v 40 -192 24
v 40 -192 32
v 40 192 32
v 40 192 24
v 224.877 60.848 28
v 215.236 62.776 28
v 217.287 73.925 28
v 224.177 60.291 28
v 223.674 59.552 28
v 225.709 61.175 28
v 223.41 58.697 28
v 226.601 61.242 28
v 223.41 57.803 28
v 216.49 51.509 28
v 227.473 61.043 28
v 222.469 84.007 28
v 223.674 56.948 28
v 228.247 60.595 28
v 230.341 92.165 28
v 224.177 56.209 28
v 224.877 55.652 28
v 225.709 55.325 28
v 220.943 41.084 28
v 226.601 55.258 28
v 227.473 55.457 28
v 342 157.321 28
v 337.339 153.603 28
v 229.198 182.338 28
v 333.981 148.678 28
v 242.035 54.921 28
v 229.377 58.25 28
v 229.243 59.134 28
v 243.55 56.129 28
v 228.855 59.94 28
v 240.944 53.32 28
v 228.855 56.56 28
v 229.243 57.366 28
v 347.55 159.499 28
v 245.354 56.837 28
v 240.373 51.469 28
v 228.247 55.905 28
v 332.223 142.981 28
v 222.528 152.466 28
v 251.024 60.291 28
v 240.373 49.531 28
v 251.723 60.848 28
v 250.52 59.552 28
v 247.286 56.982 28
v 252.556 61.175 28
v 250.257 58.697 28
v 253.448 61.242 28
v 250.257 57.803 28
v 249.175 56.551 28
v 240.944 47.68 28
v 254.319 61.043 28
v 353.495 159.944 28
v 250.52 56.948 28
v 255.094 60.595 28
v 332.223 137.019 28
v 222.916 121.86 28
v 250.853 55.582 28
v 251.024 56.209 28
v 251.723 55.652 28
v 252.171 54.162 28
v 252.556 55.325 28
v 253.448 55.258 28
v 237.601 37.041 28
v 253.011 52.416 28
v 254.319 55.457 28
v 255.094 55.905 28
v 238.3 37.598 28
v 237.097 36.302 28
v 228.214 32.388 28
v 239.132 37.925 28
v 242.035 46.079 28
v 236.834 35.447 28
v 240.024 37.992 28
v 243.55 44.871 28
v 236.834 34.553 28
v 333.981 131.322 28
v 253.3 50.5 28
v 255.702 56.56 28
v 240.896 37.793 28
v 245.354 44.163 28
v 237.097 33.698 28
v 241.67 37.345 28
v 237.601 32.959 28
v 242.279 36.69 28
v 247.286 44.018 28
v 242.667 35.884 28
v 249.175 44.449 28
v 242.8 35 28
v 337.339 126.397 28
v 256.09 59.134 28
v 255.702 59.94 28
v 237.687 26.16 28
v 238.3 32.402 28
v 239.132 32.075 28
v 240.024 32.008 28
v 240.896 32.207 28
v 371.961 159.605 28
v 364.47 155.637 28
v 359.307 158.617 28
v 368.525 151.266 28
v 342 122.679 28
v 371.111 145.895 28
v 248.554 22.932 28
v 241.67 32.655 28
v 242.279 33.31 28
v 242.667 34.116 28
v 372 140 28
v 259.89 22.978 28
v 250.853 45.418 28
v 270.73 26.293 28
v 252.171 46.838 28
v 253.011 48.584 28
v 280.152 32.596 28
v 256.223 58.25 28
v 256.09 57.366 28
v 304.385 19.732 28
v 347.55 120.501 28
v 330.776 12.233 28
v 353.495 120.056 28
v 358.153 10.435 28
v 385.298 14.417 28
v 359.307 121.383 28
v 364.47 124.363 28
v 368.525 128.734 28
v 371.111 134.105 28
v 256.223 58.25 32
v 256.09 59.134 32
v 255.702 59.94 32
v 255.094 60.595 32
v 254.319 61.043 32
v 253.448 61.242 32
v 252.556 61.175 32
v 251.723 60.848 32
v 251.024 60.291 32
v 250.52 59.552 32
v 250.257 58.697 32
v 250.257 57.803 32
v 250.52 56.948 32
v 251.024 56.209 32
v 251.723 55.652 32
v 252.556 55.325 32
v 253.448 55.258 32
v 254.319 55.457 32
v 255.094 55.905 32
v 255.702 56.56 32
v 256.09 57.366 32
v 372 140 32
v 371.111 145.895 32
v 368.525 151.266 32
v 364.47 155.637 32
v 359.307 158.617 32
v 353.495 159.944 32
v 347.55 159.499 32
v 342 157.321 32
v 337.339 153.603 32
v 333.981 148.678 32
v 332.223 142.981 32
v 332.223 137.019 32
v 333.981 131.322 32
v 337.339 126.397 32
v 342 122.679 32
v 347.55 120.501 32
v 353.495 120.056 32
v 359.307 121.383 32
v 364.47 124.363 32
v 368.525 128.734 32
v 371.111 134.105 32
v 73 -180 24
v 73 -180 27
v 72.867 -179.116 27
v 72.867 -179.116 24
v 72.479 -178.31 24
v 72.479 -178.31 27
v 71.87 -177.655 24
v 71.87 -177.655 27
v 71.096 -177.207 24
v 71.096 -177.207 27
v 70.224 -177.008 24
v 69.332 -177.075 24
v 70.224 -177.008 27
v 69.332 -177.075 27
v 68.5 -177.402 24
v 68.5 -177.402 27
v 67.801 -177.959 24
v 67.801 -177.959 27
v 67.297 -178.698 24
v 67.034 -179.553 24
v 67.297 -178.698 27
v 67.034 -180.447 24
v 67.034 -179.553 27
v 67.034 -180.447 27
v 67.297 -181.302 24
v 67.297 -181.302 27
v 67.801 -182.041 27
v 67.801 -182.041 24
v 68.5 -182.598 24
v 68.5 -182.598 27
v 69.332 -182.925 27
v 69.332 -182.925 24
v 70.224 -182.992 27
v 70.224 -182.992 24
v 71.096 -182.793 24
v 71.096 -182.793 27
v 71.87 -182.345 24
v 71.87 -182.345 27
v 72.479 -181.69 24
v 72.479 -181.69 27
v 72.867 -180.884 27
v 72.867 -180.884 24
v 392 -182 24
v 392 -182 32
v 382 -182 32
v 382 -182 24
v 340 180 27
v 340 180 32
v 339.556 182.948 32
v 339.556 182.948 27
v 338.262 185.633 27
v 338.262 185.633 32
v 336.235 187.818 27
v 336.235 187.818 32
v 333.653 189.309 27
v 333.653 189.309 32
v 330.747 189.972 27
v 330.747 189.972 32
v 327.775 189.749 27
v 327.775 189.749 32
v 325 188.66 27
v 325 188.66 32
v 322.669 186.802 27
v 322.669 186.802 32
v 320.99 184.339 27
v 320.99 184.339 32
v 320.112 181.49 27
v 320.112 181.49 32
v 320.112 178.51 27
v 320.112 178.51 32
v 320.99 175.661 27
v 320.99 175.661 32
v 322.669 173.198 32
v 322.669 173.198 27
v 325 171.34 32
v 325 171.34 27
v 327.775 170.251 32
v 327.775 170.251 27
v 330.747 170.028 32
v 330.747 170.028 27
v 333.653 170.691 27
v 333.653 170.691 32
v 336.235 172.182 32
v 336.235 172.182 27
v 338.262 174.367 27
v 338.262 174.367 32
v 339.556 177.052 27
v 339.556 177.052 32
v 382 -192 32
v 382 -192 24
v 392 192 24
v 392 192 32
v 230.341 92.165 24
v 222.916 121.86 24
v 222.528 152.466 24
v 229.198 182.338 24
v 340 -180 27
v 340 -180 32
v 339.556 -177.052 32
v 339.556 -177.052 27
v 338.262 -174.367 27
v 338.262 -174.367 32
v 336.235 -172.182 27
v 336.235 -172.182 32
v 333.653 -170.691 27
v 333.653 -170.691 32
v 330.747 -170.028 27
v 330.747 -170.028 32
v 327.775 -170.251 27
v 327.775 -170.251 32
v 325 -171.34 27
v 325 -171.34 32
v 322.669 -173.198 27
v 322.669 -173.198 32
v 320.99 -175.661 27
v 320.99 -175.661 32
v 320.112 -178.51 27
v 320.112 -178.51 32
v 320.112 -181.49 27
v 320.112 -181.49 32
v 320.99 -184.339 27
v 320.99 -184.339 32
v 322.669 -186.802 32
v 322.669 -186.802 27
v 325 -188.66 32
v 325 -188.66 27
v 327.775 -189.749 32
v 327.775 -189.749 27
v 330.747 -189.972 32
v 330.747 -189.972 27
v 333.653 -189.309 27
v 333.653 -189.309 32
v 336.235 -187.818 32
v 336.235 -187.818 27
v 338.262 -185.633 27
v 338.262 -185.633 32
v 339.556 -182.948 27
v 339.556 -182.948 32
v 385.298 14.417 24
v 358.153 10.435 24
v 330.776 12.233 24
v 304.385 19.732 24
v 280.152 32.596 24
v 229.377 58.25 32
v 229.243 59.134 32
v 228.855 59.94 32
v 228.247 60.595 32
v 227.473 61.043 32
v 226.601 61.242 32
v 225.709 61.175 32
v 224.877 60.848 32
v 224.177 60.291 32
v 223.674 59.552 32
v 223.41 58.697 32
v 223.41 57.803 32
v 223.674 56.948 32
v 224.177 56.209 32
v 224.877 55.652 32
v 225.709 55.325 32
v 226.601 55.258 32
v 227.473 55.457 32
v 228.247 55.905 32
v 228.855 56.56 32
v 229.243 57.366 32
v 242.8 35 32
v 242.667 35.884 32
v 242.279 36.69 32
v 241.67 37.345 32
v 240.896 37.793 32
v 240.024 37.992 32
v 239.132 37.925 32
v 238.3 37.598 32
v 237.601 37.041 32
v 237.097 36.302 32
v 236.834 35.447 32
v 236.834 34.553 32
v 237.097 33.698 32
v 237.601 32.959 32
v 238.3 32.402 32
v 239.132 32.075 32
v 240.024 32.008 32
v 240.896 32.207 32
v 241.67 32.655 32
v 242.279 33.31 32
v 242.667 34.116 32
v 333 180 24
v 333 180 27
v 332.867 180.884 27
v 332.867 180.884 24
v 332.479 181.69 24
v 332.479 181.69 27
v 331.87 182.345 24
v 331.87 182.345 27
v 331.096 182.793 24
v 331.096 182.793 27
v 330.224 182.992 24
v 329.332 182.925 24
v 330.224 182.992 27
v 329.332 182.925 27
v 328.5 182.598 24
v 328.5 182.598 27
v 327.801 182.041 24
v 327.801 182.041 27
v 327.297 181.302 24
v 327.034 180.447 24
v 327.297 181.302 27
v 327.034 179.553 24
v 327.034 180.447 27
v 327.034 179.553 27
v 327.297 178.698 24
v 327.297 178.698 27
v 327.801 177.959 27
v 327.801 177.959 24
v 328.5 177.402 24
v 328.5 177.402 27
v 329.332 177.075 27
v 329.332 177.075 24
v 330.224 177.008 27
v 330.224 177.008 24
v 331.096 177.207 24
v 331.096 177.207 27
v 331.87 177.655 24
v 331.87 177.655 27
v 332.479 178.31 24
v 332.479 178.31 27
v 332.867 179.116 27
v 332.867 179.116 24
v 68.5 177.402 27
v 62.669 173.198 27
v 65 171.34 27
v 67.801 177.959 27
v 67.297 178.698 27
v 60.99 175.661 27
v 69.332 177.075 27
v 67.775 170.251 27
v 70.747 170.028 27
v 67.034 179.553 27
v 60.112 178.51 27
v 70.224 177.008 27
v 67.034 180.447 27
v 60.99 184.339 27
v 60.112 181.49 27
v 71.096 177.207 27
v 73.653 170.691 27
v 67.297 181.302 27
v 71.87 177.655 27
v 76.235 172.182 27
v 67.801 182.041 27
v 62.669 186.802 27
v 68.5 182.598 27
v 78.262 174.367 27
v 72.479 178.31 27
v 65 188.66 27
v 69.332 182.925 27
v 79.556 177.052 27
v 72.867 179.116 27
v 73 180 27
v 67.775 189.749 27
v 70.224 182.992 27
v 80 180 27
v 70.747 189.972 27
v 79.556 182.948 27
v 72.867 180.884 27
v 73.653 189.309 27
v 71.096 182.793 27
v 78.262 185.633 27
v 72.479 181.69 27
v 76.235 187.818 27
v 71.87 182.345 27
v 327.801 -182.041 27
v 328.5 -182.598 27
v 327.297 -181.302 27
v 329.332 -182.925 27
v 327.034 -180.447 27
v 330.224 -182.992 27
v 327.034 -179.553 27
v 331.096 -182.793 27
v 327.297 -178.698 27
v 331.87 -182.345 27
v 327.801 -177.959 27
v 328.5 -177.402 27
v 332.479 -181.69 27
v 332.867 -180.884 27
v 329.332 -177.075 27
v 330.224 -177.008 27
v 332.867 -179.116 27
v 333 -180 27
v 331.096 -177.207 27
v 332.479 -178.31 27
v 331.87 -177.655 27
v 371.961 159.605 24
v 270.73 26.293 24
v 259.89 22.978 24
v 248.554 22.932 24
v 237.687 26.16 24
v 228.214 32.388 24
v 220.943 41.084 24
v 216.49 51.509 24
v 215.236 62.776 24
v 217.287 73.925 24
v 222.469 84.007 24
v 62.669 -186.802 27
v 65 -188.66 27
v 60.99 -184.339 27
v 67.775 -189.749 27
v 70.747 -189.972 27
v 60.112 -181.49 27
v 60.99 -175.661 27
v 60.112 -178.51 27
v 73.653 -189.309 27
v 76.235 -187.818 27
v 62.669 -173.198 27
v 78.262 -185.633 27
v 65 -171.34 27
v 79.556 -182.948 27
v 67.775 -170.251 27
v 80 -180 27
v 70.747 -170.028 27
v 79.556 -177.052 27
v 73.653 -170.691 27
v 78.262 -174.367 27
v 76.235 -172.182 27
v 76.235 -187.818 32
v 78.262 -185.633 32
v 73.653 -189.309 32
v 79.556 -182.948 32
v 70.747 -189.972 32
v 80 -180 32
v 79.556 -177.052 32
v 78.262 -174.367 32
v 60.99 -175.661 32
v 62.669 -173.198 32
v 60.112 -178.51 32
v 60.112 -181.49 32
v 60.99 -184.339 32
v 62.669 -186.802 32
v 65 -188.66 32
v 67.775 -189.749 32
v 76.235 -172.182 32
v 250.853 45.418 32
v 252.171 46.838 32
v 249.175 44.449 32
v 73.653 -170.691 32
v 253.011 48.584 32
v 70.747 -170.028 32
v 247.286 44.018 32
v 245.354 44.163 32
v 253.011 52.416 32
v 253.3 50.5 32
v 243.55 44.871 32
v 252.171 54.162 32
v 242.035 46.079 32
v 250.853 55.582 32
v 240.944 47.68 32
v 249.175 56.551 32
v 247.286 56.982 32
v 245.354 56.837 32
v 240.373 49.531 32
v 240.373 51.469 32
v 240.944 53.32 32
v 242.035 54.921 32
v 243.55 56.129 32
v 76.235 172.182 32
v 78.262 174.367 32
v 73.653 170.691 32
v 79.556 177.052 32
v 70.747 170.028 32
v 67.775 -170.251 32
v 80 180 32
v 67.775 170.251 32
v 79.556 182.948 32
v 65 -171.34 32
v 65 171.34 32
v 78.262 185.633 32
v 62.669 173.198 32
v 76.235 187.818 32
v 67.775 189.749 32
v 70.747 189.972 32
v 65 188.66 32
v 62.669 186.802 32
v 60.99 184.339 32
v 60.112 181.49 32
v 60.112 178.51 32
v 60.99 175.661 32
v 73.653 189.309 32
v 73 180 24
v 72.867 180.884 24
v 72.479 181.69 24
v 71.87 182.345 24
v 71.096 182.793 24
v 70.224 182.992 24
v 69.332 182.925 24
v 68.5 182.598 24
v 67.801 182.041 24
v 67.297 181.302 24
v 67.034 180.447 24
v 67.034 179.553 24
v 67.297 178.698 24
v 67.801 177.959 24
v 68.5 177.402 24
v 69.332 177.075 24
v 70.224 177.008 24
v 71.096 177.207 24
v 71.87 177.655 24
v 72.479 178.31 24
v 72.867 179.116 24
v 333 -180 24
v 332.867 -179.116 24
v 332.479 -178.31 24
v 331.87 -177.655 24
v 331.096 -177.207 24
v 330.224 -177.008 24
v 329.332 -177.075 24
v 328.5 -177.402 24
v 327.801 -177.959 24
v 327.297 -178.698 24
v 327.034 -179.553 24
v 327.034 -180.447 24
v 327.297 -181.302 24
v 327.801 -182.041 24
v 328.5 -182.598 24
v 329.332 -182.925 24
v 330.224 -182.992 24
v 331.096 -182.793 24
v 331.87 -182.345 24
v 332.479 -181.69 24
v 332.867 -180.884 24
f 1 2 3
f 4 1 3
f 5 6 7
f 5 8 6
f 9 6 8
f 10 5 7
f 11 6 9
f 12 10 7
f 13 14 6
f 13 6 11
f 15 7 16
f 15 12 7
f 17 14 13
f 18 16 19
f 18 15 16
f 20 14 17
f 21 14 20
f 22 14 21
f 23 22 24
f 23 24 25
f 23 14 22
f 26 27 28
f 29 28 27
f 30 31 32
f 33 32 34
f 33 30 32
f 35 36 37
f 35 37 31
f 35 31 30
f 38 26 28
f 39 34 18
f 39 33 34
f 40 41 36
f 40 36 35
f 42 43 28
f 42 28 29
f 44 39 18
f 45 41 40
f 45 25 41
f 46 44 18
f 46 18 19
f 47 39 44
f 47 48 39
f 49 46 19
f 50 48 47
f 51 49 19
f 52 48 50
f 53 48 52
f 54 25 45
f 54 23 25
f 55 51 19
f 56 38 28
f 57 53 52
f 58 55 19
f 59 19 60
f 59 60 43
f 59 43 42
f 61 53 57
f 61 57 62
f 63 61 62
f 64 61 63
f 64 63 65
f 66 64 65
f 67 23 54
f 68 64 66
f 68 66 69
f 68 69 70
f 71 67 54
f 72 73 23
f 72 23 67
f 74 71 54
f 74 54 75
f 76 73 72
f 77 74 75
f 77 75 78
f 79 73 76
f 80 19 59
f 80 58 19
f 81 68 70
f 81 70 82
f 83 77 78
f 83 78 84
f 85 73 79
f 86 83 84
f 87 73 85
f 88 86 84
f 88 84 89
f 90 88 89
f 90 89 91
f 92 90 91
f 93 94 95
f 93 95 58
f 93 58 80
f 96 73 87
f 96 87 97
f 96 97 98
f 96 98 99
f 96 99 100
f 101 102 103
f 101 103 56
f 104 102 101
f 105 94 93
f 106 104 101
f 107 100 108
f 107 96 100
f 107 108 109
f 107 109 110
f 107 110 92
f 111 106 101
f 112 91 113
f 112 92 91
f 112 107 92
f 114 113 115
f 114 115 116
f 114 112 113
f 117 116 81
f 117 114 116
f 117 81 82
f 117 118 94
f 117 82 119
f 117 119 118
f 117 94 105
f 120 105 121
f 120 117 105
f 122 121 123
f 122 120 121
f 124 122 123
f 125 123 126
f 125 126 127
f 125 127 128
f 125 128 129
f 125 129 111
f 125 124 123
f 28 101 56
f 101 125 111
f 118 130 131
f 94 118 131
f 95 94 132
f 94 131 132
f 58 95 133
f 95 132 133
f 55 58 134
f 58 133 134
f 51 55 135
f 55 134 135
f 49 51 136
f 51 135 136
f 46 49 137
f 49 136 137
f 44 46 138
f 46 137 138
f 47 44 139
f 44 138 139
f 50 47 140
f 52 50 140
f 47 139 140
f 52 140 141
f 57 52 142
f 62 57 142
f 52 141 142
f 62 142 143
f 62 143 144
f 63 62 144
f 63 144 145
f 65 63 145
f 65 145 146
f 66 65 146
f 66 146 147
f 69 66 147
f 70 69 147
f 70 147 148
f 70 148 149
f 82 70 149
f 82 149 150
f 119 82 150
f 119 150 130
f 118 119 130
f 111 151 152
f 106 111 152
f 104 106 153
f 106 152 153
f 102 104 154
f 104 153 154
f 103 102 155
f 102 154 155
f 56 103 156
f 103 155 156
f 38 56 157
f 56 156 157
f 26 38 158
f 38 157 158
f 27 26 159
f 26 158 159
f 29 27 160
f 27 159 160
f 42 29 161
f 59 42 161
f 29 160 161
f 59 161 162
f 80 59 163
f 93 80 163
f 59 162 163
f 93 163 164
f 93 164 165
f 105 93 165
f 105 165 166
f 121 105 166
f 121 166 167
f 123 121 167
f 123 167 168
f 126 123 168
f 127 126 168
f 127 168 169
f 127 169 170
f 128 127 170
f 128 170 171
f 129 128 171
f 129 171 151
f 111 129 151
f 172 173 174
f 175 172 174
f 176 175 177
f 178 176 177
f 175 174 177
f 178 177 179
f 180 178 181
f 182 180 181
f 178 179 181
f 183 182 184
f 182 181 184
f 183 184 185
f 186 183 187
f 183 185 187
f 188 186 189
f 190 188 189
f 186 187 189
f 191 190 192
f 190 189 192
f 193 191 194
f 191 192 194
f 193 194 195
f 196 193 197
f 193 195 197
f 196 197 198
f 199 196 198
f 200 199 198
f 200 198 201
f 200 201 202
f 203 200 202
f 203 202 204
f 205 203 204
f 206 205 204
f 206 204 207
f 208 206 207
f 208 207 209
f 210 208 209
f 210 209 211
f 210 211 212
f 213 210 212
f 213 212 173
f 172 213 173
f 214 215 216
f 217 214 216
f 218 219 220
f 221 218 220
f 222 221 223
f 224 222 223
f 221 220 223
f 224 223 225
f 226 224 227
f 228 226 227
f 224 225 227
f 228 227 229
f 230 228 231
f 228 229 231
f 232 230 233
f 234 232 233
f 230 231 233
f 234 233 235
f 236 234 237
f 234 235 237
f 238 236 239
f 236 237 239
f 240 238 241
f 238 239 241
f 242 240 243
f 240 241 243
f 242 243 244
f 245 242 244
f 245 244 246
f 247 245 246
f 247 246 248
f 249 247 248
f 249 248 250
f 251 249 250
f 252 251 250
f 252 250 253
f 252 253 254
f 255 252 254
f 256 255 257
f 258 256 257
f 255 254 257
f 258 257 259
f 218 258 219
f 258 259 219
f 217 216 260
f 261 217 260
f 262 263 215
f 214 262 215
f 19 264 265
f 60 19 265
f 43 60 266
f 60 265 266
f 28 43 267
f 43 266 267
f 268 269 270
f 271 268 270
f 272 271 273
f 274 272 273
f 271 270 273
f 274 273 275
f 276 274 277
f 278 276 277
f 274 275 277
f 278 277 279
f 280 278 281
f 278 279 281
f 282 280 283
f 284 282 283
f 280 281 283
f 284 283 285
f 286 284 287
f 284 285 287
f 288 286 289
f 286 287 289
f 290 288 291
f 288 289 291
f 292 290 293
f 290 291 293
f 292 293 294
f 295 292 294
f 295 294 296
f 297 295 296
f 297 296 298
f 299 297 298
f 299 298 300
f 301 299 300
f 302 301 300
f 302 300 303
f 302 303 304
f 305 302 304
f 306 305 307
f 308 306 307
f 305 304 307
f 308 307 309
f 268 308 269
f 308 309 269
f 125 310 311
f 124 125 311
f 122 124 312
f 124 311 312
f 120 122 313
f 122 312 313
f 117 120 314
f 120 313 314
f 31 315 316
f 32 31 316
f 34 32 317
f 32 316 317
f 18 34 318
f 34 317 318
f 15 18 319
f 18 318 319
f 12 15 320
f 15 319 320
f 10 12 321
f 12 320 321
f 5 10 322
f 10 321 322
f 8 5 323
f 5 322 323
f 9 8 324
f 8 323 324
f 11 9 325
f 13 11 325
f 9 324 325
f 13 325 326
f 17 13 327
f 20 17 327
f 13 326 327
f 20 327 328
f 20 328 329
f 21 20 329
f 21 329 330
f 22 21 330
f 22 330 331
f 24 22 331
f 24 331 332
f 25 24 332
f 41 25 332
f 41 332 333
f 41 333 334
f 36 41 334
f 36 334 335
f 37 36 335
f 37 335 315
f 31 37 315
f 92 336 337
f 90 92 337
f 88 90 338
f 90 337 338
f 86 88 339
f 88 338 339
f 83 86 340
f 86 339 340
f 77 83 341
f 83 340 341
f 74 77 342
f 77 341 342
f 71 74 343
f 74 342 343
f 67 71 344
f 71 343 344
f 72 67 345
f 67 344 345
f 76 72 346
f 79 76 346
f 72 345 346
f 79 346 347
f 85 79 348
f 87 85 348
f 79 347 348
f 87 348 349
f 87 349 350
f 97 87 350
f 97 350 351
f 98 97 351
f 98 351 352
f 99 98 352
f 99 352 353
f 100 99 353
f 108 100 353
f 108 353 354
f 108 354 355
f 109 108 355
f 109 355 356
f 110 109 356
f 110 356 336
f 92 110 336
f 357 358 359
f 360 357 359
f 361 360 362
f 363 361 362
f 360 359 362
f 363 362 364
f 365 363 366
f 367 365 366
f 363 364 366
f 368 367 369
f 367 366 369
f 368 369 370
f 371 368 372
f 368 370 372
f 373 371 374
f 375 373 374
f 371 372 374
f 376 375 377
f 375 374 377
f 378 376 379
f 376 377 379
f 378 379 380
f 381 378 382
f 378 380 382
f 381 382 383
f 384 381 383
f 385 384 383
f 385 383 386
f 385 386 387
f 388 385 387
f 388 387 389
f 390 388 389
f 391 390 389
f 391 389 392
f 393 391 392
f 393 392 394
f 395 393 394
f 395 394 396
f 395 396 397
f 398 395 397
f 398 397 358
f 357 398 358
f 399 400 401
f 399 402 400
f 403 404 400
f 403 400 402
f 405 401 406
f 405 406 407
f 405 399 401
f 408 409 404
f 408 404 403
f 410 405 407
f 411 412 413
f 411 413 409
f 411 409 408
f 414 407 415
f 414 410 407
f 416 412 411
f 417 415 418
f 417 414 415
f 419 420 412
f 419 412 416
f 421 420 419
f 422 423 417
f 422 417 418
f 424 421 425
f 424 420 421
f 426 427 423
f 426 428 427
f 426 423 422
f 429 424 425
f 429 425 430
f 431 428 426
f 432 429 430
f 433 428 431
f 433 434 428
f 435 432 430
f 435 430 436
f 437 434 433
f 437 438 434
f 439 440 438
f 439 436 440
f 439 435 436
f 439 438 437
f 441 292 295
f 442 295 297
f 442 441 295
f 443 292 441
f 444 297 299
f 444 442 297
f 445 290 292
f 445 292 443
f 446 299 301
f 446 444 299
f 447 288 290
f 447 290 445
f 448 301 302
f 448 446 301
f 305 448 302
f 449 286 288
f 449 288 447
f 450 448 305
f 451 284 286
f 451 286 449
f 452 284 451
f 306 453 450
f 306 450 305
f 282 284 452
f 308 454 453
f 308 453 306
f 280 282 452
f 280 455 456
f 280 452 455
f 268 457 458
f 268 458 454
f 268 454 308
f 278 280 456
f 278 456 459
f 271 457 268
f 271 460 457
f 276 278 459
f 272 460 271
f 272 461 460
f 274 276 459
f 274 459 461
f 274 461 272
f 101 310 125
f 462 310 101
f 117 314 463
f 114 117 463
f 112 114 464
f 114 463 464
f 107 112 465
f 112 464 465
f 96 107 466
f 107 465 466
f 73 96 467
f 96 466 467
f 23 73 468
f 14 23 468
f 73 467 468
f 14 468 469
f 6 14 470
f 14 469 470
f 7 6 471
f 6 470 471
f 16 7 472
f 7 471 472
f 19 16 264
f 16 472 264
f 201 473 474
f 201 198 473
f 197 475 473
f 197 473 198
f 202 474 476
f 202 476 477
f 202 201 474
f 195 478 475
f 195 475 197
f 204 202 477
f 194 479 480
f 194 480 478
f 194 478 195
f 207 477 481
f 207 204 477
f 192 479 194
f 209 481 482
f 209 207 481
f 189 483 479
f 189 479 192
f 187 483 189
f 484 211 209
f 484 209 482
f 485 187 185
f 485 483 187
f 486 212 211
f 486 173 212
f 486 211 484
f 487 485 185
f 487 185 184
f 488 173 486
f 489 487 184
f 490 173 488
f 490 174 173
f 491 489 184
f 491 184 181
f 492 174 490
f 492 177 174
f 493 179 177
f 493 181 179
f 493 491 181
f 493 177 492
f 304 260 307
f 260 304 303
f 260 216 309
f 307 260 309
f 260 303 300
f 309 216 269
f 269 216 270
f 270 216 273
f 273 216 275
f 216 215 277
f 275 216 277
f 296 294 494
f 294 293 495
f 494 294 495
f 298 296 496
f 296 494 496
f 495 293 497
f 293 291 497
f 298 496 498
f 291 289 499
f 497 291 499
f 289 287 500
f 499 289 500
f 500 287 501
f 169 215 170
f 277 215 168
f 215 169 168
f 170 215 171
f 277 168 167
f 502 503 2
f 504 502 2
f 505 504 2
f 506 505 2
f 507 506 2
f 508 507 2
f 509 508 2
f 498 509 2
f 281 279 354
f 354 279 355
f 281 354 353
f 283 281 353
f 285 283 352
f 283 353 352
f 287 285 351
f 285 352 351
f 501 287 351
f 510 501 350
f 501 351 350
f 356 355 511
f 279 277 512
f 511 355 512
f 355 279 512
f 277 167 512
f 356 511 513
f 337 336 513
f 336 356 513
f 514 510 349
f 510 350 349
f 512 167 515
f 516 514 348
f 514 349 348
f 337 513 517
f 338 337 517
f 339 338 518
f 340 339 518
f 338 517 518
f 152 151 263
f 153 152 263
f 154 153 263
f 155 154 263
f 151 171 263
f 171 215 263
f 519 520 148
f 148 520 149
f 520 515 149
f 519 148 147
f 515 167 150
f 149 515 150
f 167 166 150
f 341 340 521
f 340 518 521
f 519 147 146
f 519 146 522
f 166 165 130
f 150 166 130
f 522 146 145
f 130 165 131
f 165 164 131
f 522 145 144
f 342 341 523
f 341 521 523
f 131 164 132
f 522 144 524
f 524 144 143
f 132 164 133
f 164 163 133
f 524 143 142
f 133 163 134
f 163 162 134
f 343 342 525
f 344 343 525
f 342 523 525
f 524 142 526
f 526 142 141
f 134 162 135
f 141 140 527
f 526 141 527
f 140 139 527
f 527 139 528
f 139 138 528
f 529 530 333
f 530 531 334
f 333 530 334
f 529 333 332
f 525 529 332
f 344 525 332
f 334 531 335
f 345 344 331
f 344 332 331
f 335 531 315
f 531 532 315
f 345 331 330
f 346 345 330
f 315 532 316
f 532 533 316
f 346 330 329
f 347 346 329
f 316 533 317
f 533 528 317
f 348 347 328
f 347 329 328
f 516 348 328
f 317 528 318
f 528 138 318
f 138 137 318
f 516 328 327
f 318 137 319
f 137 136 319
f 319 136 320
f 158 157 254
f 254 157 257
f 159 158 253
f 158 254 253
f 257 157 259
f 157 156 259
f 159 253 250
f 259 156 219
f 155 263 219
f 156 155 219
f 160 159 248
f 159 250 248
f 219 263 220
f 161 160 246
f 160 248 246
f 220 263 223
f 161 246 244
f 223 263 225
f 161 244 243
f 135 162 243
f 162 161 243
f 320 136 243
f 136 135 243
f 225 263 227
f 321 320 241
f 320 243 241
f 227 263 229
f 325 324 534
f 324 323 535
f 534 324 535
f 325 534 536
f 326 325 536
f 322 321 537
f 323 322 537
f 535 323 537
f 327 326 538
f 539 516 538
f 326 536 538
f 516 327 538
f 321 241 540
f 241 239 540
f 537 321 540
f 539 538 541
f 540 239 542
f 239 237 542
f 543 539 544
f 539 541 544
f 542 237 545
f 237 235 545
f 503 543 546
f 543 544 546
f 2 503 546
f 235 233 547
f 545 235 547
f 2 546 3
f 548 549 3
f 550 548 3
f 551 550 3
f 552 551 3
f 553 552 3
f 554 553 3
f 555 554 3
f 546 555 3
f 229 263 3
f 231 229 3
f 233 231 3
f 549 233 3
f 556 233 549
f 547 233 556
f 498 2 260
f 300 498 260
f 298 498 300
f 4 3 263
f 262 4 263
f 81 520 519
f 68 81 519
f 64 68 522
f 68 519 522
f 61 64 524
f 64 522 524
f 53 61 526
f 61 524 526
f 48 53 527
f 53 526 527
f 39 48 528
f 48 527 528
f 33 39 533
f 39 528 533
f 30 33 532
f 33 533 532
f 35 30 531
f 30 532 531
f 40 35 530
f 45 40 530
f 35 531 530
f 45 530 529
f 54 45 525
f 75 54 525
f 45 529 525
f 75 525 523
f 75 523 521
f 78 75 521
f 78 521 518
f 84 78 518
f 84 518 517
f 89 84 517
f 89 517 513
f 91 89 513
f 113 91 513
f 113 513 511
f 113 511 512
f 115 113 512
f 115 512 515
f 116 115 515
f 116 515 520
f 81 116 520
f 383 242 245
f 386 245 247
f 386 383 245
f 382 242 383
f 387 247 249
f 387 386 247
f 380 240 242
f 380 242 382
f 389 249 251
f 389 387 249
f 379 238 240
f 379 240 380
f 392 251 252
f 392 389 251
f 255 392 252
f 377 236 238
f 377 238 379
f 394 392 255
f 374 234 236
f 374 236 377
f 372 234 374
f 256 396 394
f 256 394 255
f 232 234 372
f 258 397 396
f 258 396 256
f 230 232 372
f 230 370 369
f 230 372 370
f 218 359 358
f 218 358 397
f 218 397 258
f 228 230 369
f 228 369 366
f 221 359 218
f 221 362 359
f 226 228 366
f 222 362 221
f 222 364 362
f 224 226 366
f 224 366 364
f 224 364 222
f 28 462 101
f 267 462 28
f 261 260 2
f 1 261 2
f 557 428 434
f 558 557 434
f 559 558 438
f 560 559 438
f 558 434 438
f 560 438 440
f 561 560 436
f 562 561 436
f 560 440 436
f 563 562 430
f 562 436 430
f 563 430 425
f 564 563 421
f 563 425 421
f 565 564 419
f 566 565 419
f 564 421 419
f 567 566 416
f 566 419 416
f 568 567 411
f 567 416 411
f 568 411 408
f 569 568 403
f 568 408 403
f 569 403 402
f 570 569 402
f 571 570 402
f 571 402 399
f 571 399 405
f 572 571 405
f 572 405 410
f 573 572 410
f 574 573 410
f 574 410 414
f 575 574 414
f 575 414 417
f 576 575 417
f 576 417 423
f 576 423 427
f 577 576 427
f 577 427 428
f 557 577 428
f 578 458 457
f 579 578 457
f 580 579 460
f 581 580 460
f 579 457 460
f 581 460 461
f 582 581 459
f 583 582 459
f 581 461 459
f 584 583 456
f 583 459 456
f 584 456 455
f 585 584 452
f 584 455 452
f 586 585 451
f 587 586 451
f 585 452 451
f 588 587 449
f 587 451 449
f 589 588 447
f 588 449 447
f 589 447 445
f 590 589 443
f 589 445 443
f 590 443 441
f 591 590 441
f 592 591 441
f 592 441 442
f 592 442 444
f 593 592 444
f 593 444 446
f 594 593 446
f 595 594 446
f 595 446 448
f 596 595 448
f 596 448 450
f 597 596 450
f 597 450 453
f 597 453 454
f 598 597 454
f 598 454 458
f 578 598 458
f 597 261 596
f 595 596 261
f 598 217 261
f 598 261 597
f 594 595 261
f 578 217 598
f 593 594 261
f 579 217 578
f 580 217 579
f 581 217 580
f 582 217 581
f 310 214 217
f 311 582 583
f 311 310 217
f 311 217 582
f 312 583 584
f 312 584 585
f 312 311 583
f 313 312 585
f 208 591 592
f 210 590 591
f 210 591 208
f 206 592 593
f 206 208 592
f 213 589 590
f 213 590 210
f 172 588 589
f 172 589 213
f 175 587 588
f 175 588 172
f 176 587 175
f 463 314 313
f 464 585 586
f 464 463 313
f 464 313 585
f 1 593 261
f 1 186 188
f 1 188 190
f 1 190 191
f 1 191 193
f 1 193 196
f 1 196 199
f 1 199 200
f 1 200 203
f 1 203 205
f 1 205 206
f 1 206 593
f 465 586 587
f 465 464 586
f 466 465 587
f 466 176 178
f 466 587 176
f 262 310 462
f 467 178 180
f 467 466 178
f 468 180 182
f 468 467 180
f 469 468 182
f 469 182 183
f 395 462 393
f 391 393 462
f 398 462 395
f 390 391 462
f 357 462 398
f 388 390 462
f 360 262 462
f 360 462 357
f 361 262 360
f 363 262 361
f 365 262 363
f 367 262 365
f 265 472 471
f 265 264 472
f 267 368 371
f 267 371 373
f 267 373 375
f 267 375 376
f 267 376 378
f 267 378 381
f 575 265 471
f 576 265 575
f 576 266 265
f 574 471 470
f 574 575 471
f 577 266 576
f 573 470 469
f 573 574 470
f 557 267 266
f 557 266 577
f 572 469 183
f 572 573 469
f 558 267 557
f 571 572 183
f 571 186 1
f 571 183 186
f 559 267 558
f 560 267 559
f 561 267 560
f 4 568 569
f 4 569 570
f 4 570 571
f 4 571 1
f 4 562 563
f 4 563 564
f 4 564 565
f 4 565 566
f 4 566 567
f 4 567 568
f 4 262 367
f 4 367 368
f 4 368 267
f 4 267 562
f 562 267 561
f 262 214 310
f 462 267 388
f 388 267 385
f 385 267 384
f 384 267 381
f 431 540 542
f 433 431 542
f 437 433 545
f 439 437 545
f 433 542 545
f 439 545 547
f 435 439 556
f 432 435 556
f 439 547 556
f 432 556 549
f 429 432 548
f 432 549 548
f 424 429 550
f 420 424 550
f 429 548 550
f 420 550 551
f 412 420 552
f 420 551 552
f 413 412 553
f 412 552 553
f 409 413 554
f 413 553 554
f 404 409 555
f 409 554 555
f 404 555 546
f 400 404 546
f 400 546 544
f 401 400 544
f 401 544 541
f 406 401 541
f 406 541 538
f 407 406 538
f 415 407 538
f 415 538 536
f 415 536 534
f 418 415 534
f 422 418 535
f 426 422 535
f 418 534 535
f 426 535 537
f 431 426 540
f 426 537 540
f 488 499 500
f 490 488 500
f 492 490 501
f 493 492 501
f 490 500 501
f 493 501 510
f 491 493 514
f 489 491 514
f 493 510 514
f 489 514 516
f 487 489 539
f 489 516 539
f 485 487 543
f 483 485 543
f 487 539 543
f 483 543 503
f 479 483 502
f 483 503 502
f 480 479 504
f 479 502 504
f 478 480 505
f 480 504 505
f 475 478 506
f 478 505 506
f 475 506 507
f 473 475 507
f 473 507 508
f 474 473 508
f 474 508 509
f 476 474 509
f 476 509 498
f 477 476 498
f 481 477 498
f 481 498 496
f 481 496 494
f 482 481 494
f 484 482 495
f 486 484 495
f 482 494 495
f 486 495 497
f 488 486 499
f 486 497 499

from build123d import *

# Parameters (mm, degrees)
SKETCH_R        = 6.5
SKETCH_R_2      = 3
SKETCH_R_3      = 20
PAD014_DEPTH    = 8
SKETCH029_R     = 10
POCKET004_DEPTH = 5
POCKET008_DEPTH = 4


with BuildPart() as part:
    # Sketch → Pad014 (new body)
    with BuildSketch(Plane.XY.offset(32)):
        Polygon((40, 192), (392, 192), (392, -182), (382, -182), (382, -192), (40, -192), align=None)
        with Locations((246.8, 50.5)):
            Circle(SKETCH_R, mode=Mode.SUBTRACT)
        with Locations((239.8, 35)):
            Circle(SKETCH_R_2, mode=Mode.SUBTRACT)
        with Locations((226.376606, 58.25)):
            Circle(SKETCH_R_2, mode=Mode.SUBTRACT)
        with Locations((253.223394, 58.25)):
            Circle(SKETCH_R_2, mode=Mode.SUBTRACT)
        with Locations((70, 180)):
            Circle(SKETCH_R_2, mode=Mode.SUBTRACT)
        with Locations((330, 180)):
            Circle(SKETCH_R_2, mode=Mode.SUBTRACT)
        with Locations((70, -180)):
            Circle(SKETCH_R_2, mode=Mode.SUBTRACT)
        with Locations((330, -180)):
            Circle(SKETCH_R_2, mode=Mode.SUBTRACT)
        with Locations((352, 140)):
            Circle(SKETCH_R_3, mode=Mode.SUBTRACT)
    extrude(amount=-PAD014_DEPTH)

    # Sketch029 → Pocket004 (cut)
    with BuildSketch(Plane.XY.offset(32)):
        with Locations((70, 180)):
            Circle(SKETCH029_R)
        with Locations((330, 180)):
            Circle(SKETCH029_R)
        with Locations((330, -180)):
            Circle(SKETCH029_R)
        with Locations((70, -180)):
            Circle(SKETCH029_R)
    extrude(amount=-POCKET004_DEPTH, mode=Mode.SUBTRACT)

    # Sketch037 → Pocket008 (cut)
    with BuildSketch(Plane(origin=(0, 0, 24), x_dir=(1, 0, 0), z_dir=(0, 0, -1))):
        with BuildLine():
            ThreePointArc((230.340527, -92.165245), (221.832227, -137.151247), (229.197543, -182.338454))
            Line((371.961304, -159.605377), (229.197543, -182.338454))
            Line((385.298035, -14.416777), (371.961304, -159.605377))
            ThreePointArc((385.298035, -14.416777), (330.776181, -12.233466), (280.15249, -32.596211))
            ThreePointArc((280.15249, -32.596211), (224.259659, -36.469349), (230.340527, -92.165245))
        make_face()
    extrude(amount=-POCKET008_DEPTH, mode=Mode.SUBTRACT)


solid = part.part
